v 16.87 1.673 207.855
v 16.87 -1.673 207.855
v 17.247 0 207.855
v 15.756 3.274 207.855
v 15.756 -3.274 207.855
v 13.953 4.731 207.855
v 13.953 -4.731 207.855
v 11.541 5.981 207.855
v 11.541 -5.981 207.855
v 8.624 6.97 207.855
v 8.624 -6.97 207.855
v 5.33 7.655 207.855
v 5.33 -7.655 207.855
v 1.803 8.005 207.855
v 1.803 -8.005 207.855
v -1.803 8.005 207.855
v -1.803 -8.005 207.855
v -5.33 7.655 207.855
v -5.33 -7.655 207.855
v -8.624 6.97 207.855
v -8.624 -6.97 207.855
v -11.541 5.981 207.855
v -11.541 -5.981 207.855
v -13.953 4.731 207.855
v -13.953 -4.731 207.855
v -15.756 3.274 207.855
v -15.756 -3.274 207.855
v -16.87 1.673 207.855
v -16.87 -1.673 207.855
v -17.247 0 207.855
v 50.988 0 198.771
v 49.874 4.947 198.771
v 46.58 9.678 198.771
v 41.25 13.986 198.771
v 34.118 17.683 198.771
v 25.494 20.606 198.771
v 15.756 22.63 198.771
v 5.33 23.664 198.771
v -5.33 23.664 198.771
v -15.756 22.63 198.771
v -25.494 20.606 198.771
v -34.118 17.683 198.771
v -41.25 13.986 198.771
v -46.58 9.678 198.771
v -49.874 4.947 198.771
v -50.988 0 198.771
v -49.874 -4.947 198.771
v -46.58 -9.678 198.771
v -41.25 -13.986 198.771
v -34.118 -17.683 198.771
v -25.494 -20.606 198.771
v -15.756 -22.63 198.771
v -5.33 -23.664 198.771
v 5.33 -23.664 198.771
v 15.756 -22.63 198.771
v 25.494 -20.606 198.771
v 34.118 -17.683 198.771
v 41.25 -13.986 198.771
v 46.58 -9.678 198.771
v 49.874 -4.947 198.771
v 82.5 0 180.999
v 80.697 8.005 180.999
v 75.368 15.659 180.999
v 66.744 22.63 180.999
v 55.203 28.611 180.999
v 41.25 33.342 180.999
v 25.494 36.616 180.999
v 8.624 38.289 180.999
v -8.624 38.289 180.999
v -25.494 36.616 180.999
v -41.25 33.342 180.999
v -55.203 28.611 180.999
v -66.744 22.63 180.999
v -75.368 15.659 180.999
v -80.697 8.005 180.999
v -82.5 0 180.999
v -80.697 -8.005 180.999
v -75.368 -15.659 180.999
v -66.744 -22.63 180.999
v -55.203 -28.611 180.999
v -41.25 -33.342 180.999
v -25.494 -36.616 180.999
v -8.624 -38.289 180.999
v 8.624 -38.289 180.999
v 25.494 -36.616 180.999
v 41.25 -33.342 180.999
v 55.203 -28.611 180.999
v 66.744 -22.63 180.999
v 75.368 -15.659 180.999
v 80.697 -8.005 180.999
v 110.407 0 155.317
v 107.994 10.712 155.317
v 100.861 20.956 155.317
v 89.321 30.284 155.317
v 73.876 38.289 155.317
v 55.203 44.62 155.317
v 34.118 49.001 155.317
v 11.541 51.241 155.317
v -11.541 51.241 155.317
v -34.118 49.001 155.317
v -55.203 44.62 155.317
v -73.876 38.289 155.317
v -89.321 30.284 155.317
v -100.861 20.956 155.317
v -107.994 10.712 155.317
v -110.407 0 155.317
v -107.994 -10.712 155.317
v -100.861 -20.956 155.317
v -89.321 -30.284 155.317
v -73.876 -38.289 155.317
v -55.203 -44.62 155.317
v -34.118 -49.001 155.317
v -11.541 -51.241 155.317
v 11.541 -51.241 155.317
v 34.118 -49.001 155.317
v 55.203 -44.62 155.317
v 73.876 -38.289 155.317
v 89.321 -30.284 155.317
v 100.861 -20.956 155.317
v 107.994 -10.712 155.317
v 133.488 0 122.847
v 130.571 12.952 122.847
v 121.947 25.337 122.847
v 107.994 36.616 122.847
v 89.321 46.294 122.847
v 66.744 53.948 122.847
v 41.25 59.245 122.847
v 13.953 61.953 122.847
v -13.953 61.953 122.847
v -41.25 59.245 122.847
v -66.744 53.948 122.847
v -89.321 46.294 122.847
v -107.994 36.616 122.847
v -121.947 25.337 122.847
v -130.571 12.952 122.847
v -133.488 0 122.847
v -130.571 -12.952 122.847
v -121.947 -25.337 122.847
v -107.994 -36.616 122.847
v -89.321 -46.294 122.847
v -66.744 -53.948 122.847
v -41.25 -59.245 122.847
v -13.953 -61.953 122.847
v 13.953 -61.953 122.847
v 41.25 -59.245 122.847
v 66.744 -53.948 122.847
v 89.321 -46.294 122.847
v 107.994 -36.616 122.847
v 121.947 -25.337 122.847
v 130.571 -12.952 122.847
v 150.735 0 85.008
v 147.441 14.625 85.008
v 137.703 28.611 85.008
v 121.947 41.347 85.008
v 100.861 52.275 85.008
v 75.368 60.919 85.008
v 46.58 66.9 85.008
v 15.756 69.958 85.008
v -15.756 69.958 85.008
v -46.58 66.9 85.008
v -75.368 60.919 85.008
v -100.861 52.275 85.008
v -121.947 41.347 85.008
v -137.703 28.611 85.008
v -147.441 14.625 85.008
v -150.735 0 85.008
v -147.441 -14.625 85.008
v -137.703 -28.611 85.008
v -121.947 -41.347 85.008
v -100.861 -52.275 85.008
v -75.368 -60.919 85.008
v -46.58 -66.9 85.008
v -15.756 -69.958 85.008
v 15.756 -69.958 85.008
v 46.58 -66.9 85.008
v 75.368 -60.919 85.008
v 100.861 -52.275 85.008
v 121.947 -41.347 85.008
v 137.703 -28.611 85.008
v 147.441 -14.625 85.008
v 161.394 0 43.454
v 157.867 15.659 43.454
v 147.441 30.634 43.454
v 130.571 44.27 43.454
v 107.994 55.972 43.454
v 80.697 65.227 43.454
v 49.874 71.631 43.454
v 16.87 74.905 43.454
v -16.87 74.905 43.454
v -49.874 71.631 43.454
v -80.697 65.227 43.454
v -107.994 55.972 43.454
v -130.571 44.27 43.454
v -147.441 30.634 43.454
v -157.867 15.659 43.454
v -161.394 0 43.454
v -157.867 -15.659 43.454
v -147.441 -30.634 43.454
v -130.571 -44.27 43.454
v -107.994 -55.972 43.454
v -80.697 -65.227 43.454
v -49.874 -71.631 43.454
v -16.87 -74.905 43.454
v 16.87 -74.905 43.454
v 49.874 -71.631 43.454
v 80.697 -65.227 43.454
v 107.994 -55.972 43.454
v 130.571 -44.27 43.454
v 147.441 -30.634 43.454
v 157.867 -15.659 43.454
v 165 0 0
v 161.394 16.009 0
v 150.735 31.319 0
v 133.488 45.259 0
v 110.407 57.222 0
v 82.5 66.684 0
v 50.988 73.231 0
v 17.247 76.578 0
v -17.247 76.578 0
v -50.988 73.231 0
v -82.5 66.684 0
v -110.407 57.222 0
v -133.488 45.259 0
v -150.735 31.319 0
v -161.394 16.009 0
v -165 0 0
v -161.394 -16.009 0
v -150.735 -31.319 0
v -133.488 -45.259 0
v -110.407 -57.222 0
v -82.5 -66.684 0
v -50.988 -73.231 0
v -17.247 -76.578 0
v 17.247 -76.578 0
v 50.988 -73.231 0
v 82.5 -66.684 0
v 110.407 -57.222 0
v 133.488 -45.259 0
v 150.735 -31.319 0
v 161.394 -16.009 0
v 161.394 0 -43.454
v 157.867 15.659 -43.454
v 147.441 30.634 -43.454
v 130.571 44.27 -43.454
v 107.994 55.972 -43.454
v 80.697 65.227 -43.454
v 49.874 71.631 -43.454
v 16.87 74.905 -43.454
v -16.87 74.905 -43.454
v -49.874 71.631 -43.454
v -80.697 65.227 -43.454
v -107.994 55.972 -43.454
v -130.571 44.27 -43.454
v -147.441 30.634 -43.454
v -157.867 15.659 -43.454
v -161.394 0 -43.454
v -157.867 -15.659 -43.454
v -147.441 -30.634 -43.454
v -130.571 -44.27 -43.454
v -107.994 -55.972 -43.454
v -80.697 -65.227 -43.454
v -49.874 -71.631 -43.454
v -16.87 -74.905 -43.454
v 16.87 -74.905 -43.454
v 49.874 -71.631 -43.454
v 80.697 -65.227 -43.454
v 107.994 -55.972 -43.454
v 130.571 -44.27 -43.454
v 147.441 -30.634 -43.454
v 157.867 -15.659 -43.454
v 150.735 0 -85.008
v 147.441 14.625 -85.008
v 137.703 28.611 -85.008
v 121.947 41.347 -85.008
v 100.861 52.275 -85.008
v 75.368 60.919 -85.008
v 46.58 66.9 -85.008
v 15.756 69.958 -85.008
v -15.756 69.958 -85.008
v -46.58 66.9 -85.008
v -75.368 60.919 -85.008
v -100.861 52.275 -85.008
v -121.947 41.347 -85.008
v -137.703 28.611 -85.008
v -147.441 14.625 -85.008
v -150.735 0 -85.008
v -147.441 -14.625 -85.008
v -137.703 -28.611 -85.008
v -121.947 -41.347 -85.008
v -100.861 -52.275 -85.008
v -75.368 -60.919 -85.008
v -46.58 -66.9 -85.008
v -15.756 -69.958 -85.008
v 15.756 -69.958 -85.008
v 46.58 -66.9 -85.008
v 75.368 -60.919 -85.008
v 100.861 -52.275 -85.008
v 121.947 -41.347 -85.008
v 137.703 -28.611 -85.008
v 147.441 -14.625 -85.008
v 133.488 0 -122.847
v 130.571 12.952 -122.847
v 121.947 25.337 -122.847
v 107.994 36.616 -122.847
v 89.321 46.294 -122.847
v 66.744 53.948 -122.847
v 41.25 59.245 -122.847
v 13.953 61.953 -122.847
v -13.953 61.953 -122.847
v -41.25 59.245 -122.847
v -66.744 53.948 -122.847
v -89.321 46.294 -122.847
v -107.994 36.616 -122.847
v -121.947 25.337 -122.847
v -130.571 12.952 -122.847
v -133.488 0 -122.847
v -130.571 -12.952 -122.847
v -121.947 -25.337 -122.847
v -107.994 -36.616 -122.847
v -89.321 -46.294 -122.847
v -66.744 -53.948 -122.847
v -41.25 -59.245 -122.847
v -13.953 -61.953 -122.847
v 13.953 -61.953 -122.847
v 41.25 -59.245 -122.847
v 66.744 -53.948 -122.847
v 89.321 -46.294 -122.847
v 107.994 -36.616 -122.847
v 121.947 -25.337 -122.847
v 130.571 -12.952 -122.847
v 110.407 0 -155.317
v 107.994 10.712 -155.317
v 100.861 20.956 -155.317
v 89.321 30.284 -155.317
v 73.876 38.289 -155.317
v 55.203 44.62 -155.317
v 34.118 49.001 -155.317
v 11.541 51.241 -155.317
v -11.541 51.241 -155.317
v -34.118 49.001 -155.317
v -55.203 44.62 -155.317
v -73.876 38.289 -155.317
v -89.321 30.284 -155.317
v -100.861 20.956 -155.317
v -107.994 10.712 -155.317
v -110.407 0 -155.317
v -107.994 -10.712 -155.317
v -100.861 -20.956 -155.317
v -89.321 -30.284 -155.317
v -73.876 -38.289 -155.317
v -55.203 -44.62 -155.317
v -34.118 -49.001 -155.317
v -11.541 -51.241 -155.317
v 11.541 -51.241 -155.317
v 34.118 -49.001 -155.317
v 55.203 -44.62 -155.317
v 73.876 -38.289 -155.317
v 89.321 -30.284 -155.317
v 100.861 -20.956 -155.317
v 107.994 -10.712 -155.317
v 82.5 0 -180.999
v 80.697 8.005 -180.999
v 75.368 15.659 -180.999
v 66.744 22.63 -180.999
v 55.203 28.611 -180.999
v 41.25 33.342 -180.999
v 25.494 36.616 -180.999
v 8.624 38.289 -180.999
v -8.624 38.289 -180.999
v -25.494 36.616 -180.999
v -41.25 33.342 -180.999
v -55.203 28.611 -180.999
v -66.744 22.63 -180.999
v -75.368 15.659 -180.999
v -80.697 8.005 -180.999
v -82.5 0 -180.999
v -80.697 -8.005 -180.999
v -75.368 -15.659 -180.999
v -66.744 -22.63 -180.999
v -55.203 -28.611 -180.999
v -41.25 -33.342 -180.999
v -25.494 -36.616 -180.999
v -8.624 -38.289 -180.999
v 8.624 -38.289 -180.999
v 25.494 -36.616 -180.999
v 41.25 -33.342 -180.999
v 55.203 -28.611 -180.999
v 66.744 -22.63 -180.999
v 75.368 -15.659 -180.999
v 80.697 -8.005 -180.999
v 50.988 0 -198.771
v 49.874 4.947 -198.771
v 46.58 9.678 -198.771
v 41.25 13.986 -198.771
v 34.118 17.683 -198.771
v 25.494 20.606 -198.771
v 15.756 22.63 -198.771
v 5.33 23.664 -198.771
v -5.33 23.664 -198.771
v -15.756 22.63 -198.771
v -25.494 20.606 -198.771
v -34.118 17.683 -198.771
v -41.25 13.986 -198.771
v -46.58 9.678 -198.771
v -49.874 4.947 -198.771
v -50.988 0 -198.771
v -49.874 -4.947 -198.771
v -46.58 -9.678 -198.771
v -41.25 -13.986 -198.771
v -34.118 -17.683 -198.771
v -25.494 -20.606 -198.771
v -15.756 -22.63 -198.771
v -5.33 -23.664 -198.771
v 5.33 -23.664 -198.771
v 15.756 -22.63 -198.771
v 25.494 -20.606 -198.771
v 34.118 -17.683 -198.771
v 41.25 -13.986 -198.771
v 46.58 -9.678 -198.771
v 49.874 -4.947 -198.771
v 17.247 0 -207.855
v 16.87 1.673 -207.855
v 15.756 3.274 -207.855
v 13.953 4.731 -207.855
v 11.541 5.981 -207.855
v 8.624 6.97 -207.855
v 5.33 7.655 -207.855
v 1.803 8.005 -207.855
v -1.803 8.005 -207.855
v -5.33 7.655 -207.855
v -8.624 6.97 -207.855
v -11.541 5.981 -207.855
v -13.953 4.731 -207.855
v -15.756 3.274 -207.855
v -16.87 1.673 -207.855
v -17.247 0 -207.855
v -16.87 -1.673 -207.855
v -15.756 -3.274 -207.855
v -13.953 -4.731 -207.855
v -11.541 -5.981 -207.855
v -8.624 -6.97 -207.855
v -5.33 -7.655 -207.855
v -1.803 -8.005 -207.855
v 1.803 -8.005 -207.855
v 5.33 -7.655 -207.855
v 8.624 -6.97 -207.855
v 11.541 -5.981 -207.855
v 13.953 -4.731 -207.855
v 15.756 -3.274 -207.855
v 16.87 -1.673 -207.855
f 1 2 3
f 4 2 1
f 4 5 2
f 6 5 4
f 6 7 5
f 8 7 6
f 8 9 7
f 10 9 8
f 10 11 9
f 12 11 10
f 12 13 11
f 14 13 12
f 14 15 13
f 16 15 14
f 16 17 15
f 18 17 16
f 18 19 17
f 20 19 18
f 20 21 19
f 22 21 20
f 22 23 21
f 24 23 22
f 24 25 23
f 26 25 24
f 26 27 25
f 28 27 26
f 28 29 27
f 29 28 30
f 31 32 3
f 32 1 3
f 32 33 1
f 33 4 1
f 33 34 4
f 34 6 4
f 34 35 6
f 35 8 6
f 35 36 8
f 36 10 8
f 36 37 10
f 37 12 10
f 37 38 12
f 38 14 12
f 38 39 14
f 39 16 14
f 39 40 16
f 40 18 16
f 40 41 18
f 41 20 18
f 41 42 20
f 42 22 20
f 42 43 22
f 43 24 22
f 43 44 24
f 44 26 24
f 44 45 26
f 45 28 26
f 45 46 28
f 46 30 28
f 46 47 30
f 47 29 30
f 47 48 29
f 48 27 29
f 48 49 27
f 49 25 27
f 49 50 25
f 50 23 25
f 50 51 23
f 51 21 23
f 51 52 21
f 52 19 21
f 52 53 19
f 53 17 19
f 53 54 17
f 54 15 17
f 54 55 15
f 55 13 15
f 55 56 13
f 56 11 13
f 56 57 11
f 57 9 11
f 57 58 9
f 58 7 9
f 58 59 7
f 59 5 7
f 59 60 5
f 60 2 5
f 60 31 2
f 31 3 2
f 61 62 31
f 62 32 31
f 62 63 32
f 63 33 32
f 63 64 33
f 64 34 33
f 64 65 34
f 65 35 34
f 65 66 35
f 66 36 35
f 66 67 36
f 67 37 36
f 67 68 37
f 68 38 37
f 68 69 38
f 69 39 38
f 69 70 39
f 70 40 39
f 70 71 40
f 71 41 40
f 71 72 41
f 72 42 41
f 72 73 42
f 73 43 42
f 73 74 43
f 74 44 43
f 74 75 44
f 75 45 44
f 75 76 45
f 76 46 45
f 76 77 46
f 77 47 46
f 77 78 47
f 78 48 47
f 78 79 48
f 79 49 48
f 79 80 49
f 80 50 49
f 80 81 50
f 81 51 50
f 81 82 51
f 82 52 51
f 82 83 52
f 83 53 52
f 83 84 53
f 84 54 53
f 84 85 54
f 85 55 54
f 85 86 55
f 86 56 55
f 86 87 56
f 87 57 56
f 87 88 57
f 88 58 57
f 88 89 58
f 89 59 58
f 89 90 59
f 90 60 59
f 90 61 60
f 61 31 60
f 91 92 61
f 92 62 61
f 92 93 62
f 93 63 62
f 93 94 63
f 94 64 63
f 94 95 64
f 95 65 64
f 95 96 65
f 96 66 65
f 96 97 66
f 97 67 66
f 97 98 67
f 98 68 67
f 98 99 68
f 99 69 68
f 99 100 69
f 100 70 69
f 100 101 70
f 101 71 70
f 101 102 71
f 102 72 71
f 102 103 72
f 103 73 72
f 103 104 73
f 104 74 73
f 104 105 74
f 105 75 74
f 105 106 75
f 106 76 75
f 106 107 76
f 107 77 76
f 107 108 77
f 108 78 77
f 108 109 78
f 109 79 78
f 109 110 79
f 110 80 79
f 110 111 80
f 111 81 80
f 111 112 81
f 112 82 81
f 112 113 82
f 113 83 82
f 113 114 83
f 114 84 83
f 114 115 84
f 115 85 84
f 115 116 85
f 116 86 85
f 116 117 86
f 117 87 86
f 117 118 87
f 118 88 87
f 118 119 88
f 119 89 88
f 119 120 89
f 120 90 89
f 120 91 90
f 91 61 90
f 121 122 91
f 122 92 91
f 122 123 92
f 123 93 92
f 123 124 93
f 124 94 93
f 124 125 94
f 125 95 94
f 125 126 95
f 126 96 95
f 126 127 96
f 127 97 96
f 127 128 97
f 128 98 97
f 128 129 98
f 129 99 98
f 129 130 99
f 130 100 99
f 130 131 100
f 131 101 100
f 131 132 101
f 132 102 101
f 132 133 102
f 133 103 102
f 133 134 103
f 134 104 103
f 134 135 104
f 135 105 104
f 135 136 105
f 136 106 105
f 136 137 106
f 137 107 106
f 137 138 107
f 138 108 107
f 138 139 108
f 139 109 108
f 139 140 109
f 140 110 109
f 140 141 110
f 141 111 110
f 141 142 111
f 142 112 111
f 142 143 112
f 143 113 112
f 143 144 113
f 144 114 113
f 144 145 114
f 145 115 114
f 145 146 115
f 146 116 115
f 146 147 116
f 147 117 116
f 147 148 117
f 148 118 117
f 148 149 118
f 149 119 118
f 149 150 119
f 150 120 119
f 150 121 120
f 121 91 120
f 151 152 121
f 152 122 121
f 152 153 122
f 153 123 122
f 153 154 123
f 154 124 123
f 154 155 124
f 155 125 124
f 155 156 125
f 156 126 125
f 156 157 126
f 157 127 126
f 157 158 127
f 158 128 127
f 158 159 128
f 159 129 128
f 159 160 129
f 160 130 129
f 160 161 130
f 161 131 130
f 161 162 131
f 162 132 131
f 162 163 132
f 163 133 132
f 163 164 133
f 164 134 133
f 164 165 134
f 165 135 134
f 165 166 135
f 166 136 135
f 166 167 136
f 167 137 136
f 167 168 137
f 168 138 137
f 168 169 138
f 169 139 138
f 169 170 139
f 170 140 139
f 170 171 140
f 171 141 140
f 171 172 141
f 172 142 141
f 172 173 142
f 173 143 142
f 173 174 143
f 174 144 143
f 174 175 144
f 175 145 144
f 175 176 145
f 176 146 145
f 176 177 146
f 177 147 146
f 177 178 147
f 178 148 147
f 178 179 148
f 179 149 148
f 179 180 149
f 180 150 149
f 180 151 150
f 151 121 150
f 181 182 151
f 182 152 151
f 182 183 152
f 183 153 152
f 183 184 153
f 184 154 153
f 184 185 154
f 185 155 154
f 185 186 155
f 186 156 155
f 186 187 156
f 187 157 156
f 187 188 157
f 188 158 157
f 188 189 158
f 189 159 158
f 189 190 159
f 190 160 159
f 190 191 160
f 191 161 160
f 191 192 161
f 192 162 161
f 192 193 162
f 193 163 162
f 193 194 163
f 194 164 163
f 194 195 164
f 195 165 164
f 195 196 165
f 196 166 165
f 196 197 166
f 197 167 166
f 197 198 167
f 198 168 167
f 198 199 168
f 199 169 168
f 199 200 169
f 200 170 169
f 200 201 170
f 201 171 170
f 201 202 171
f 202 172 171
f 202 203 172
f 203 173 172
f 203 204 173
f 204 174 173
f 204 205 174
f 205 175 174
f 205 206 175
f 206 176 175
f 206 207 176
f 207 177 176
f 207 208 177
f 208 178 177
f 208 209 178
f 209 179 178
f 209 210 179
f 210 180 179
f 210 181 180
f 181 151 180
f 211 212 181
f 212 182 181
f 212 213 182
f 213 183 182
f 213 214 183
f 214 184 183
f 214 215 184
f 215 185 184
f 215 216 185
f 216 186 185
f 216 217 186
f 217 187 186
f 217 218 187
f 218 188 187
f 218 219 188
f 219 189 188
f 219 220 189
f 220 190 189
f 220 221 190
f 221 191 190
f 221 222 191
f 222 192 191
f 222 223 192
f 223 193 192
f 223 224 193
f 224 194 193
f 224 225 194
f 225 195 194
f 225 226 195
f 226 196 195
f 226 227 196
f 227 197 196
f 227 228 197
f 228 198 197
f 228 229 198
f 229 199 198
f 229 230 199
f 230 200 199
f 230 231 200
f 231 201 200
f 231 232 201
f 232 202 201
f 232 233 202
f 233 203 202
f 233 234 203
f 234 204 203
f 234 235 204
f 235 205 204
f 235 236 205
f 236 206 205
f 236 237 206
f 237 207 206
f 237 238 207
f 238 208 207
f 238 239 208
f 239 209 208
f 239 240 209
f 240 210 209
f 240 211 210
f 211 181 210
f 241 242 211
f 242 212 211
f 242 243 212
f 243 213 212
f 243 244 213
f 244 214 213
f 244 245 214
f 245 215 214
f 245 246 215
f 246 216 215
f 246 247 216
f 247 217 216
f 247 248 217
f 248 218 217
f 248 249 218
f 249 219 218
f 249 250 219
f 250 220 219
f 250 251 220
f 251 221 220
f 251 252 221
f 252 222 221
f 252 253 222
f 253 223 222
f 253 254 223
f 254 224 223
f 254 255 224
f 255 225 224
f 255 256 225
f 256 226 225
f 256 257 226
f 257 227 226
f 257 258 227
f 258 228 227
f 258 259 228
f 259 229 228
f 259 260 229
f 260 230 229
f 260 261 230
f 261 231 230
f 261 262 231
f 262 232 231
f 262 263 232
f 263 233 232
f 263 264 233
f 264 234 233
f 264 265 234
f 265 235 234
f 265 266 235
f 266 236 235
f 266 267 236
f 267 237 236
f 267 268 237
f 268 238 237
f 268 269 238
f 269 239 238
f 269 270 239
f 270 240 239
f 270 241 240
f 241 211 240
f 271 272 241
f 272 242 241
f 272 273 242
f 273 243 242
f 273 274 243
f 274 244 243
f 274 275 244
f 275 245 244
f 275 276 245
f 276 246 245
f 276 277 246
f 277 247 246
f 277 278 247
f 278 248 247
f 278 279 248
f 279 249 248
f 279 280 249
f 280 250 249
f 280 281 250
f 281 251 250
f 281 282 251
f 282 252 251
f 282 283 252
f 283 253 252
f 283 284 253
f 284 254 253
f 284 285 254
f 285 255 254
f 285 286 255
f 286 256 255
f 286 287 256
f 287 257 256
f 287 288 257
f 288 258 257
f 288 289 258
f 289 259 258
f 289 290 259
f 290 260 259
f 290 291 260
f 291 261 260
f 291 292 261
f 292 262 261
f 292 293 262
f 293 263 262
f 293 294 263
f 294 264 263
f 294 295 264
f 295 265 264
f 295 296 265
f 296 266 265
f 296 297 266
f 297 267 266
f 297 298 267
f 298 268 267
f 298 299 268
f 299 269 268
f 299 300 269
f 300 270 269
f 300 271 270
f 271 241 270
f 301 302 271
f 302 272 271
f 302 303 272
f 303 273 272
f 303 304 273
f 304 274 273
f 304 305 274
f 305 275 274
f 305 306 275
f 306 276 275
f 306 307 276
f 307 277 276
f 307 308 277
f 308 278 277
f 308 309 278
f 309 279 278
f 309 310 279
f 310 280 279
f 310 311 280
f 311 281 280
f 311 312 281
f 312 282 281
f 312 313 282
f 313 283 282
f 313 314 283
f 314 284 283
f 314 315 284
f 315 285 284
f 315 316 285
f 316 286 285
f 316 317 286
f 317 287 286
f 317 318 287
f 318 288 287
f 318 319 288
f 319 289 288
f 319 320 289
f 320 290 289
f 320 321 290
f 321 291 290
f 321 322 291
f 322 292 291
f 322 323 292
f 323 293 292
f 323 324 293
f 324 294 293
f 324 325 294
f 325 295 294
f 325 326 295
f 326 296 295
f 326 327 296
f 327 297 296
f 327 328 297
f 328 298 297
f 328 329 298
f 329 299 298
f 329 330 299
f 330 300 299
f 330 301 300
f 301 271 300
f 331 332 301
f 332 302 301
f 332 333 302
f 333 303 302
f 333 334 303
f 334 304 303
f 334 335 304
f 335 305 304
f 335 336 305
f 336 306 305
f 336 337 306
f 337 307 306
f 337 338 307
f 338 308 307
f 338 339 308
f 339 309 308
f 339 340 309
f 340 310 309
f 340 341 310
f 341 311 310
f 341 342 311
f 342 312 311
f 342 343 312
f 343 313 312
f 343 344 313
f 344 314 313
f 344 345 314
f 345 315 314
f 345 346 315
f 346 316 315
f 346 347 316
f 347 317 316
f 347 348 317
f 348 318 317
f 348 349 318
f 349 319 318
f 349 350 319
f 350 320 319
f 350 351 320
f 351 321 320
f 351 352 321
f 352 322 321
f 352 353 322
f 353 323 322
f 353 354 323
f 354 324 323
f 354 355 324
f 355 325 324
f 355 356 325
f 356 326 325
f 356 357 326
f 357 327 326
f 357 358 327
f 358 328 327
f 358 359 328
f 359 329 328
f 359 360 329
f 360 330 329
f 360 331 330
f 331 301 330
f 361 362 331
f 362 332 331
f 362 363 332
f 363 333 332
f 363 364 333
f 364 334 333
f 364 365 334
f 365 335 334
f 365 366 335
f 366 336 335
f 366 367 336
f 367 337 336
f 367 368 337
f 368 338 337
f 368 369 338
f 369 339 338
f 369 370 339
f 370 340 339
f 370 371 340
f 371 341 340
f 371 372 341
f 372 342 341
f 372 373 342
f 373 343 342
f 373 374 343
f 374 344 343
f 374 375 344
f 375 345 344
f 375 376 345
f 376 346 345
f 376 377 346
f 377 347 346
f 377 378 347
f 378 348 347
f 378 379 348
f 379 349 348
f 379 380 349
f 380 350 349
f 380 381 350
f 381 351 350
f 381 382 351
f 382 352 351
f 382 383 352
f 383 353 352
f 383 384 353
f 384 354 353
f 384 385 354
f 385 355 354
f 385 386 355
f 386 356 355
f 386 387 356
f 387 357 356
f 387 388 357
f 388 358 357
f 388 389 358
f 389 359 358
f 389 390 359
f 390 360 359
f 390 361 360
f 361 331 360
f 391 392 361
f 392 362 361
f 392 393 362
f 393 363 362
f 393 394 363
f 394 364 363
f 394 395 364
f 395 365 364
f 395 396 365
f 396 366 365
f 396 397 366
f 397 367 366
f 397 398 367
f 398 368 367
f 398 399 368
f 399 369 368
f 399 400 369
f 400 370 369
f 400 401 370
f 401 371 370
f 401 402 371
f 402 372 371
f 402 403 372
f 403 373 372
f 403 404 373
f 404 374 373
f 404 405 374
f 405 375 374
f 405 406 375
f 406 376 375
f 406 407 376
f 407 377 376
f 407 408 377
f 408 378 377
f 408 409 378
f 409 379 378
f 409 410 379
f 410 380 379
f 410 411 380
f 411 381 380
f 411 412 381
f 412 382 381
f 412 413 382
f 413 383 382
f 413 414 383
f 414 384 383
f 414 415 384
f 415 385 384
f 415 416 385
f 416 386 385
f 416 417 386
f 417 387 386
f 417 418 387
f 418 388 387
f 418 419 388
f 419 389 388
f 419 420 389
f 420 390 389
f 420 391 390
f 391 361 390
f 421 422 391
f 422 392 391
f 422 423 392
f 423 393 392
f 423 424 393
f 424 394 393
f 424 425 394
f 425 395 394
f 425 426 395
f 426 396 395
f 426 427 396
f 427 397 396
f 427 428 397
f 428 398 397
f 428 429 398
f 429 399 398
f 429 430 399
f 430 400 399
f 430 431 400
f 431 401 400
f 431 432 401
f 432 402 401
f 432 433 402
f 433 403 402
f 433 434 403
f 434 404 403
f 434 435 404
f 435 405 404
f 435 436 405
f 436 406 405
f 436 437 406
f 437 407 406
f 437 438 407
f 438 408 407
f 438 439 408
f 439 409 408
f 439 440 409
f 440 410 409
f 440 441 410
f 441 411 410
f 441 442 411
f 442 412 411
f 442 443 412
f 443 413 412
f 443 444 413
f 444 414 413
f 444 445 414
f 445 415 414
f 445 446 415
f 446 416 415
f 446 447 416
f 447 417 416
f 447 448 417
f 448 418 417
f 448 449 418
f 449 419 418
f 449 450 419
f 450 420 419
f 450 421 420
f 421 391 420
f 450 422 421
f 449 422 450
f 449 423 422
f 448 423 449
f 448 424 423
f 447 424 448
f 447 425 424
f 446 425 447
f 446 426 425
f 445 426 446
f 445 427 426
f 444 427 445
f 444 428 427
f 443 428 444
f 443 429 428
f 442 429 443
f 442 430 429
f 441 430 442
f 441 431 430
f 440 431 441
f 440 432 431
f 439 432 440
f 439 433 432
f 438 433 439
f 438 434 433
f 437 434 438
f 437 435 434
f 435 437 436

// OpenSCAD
// Generated by SolidPython 1.0.1 on 2020-07-29 00:46:51


scale(v = [15, 7, 19]) {
	sphere(r = 11);
}
/***********************************************
*********      SolidPython code:      **********
************************************************
 
# import packages: SolidPython
from solid import *
from solid.utils import *
from itertools import chain, combinations, permutations


class Resize:

    def __init__(self, scad_file):
        self.scad_file = scad_file
        #self.scad_file = import_scad(scad_file)
        # cone/cylinder param:
        self.r1 = 0
        self.r2 = 0
        self.h = 0
        # rectangular prism param:
        self.w = 0
        self.l = 0
        # ellipse param:
        self.r = 0

    # import OpenScad code (file name corresponds to shape)


    # classify shape + parameters
    def assign(self, param1, param2, param3):
        if self.scad_file == 'cone.scad':
            self.r1 = param1
            self.r2 = param2
            self.h = param3
        elif self.scad_file == 'cylinder.scad':
            self.r1 = param1
            self.r2 = param2
            self.h = param3
        elif self.scad_file == 'rectangularPrism.scad':
            self.h = param1
            self.l = param2
            self.w = param3
        else:
            self.r = param1
            self.h = param2

    # resize parameters
    def iterate(self):
        x = range(3, 20, 2)
        i = 1
        if self.scad_file == 'cone.scad':
            tempList = list(permutations(x, 2))
            for temp in tempList:
                param1 = temp[0]
                param2 = temp[1]
                filepath = 'produced_scad_files/' + 'cone' + str(param1) + '_' + str(param2) + '_' + '.scad'
                scad_render_to_file(cylinder(h=param1, r1=param2, r2=0), filepath)

        elif self.scad_file == 'cylinder.scad':
            tempList = list(permutations(x, 3))
            for temp in tempList:
                param1 = temp[0]
                param2 = temp[1]
                filepath = 'produced_scad_files/' + 'cylinder' + str(param1) + '_' + str(param2) + '_' + '.scad'
                scad_render_to_file(cylinder(h=param1, r1=param2, r2=param2), filepath)

        elif self.scad_file == 'rectangularPrism.scad':
            tempList = list(permutations(x, 3))
            for temp in tempList:
                param1 = temp[0]
                param2 = temp[1]
                param3 = temp[2]
                filepath = 'produced_scad_files/' + 'rectangularPrism' + str(param1) + '_' + str(param2) + '_' + str(
                    param3) + '.scad'
                scad_render_to_file(cube(size=(param1, param2, param3)), filepath)

        elif self.scad_file == 'ellipse.scad':
            tempList = list(permutations(x, 4))
            for temp in tempList:
                param1 = temp[0]
                param2 = temp[1]
                param3 = temp[2]
                param4 = temp[3]
                filepath = 'produced_scad_files/' + 'ellipse' + str(param1) + '_' + str(param2) + '_' + str(param3) + '_' + str(param4) + '.scad'
                scad_render_to_file(scale([param1, param2, param3])(sphere(r=param4)), filepath)

    def render_to_scadfile(self):
        scad_render_to_file(scad, 'example.scad') 
 
************************************************/
